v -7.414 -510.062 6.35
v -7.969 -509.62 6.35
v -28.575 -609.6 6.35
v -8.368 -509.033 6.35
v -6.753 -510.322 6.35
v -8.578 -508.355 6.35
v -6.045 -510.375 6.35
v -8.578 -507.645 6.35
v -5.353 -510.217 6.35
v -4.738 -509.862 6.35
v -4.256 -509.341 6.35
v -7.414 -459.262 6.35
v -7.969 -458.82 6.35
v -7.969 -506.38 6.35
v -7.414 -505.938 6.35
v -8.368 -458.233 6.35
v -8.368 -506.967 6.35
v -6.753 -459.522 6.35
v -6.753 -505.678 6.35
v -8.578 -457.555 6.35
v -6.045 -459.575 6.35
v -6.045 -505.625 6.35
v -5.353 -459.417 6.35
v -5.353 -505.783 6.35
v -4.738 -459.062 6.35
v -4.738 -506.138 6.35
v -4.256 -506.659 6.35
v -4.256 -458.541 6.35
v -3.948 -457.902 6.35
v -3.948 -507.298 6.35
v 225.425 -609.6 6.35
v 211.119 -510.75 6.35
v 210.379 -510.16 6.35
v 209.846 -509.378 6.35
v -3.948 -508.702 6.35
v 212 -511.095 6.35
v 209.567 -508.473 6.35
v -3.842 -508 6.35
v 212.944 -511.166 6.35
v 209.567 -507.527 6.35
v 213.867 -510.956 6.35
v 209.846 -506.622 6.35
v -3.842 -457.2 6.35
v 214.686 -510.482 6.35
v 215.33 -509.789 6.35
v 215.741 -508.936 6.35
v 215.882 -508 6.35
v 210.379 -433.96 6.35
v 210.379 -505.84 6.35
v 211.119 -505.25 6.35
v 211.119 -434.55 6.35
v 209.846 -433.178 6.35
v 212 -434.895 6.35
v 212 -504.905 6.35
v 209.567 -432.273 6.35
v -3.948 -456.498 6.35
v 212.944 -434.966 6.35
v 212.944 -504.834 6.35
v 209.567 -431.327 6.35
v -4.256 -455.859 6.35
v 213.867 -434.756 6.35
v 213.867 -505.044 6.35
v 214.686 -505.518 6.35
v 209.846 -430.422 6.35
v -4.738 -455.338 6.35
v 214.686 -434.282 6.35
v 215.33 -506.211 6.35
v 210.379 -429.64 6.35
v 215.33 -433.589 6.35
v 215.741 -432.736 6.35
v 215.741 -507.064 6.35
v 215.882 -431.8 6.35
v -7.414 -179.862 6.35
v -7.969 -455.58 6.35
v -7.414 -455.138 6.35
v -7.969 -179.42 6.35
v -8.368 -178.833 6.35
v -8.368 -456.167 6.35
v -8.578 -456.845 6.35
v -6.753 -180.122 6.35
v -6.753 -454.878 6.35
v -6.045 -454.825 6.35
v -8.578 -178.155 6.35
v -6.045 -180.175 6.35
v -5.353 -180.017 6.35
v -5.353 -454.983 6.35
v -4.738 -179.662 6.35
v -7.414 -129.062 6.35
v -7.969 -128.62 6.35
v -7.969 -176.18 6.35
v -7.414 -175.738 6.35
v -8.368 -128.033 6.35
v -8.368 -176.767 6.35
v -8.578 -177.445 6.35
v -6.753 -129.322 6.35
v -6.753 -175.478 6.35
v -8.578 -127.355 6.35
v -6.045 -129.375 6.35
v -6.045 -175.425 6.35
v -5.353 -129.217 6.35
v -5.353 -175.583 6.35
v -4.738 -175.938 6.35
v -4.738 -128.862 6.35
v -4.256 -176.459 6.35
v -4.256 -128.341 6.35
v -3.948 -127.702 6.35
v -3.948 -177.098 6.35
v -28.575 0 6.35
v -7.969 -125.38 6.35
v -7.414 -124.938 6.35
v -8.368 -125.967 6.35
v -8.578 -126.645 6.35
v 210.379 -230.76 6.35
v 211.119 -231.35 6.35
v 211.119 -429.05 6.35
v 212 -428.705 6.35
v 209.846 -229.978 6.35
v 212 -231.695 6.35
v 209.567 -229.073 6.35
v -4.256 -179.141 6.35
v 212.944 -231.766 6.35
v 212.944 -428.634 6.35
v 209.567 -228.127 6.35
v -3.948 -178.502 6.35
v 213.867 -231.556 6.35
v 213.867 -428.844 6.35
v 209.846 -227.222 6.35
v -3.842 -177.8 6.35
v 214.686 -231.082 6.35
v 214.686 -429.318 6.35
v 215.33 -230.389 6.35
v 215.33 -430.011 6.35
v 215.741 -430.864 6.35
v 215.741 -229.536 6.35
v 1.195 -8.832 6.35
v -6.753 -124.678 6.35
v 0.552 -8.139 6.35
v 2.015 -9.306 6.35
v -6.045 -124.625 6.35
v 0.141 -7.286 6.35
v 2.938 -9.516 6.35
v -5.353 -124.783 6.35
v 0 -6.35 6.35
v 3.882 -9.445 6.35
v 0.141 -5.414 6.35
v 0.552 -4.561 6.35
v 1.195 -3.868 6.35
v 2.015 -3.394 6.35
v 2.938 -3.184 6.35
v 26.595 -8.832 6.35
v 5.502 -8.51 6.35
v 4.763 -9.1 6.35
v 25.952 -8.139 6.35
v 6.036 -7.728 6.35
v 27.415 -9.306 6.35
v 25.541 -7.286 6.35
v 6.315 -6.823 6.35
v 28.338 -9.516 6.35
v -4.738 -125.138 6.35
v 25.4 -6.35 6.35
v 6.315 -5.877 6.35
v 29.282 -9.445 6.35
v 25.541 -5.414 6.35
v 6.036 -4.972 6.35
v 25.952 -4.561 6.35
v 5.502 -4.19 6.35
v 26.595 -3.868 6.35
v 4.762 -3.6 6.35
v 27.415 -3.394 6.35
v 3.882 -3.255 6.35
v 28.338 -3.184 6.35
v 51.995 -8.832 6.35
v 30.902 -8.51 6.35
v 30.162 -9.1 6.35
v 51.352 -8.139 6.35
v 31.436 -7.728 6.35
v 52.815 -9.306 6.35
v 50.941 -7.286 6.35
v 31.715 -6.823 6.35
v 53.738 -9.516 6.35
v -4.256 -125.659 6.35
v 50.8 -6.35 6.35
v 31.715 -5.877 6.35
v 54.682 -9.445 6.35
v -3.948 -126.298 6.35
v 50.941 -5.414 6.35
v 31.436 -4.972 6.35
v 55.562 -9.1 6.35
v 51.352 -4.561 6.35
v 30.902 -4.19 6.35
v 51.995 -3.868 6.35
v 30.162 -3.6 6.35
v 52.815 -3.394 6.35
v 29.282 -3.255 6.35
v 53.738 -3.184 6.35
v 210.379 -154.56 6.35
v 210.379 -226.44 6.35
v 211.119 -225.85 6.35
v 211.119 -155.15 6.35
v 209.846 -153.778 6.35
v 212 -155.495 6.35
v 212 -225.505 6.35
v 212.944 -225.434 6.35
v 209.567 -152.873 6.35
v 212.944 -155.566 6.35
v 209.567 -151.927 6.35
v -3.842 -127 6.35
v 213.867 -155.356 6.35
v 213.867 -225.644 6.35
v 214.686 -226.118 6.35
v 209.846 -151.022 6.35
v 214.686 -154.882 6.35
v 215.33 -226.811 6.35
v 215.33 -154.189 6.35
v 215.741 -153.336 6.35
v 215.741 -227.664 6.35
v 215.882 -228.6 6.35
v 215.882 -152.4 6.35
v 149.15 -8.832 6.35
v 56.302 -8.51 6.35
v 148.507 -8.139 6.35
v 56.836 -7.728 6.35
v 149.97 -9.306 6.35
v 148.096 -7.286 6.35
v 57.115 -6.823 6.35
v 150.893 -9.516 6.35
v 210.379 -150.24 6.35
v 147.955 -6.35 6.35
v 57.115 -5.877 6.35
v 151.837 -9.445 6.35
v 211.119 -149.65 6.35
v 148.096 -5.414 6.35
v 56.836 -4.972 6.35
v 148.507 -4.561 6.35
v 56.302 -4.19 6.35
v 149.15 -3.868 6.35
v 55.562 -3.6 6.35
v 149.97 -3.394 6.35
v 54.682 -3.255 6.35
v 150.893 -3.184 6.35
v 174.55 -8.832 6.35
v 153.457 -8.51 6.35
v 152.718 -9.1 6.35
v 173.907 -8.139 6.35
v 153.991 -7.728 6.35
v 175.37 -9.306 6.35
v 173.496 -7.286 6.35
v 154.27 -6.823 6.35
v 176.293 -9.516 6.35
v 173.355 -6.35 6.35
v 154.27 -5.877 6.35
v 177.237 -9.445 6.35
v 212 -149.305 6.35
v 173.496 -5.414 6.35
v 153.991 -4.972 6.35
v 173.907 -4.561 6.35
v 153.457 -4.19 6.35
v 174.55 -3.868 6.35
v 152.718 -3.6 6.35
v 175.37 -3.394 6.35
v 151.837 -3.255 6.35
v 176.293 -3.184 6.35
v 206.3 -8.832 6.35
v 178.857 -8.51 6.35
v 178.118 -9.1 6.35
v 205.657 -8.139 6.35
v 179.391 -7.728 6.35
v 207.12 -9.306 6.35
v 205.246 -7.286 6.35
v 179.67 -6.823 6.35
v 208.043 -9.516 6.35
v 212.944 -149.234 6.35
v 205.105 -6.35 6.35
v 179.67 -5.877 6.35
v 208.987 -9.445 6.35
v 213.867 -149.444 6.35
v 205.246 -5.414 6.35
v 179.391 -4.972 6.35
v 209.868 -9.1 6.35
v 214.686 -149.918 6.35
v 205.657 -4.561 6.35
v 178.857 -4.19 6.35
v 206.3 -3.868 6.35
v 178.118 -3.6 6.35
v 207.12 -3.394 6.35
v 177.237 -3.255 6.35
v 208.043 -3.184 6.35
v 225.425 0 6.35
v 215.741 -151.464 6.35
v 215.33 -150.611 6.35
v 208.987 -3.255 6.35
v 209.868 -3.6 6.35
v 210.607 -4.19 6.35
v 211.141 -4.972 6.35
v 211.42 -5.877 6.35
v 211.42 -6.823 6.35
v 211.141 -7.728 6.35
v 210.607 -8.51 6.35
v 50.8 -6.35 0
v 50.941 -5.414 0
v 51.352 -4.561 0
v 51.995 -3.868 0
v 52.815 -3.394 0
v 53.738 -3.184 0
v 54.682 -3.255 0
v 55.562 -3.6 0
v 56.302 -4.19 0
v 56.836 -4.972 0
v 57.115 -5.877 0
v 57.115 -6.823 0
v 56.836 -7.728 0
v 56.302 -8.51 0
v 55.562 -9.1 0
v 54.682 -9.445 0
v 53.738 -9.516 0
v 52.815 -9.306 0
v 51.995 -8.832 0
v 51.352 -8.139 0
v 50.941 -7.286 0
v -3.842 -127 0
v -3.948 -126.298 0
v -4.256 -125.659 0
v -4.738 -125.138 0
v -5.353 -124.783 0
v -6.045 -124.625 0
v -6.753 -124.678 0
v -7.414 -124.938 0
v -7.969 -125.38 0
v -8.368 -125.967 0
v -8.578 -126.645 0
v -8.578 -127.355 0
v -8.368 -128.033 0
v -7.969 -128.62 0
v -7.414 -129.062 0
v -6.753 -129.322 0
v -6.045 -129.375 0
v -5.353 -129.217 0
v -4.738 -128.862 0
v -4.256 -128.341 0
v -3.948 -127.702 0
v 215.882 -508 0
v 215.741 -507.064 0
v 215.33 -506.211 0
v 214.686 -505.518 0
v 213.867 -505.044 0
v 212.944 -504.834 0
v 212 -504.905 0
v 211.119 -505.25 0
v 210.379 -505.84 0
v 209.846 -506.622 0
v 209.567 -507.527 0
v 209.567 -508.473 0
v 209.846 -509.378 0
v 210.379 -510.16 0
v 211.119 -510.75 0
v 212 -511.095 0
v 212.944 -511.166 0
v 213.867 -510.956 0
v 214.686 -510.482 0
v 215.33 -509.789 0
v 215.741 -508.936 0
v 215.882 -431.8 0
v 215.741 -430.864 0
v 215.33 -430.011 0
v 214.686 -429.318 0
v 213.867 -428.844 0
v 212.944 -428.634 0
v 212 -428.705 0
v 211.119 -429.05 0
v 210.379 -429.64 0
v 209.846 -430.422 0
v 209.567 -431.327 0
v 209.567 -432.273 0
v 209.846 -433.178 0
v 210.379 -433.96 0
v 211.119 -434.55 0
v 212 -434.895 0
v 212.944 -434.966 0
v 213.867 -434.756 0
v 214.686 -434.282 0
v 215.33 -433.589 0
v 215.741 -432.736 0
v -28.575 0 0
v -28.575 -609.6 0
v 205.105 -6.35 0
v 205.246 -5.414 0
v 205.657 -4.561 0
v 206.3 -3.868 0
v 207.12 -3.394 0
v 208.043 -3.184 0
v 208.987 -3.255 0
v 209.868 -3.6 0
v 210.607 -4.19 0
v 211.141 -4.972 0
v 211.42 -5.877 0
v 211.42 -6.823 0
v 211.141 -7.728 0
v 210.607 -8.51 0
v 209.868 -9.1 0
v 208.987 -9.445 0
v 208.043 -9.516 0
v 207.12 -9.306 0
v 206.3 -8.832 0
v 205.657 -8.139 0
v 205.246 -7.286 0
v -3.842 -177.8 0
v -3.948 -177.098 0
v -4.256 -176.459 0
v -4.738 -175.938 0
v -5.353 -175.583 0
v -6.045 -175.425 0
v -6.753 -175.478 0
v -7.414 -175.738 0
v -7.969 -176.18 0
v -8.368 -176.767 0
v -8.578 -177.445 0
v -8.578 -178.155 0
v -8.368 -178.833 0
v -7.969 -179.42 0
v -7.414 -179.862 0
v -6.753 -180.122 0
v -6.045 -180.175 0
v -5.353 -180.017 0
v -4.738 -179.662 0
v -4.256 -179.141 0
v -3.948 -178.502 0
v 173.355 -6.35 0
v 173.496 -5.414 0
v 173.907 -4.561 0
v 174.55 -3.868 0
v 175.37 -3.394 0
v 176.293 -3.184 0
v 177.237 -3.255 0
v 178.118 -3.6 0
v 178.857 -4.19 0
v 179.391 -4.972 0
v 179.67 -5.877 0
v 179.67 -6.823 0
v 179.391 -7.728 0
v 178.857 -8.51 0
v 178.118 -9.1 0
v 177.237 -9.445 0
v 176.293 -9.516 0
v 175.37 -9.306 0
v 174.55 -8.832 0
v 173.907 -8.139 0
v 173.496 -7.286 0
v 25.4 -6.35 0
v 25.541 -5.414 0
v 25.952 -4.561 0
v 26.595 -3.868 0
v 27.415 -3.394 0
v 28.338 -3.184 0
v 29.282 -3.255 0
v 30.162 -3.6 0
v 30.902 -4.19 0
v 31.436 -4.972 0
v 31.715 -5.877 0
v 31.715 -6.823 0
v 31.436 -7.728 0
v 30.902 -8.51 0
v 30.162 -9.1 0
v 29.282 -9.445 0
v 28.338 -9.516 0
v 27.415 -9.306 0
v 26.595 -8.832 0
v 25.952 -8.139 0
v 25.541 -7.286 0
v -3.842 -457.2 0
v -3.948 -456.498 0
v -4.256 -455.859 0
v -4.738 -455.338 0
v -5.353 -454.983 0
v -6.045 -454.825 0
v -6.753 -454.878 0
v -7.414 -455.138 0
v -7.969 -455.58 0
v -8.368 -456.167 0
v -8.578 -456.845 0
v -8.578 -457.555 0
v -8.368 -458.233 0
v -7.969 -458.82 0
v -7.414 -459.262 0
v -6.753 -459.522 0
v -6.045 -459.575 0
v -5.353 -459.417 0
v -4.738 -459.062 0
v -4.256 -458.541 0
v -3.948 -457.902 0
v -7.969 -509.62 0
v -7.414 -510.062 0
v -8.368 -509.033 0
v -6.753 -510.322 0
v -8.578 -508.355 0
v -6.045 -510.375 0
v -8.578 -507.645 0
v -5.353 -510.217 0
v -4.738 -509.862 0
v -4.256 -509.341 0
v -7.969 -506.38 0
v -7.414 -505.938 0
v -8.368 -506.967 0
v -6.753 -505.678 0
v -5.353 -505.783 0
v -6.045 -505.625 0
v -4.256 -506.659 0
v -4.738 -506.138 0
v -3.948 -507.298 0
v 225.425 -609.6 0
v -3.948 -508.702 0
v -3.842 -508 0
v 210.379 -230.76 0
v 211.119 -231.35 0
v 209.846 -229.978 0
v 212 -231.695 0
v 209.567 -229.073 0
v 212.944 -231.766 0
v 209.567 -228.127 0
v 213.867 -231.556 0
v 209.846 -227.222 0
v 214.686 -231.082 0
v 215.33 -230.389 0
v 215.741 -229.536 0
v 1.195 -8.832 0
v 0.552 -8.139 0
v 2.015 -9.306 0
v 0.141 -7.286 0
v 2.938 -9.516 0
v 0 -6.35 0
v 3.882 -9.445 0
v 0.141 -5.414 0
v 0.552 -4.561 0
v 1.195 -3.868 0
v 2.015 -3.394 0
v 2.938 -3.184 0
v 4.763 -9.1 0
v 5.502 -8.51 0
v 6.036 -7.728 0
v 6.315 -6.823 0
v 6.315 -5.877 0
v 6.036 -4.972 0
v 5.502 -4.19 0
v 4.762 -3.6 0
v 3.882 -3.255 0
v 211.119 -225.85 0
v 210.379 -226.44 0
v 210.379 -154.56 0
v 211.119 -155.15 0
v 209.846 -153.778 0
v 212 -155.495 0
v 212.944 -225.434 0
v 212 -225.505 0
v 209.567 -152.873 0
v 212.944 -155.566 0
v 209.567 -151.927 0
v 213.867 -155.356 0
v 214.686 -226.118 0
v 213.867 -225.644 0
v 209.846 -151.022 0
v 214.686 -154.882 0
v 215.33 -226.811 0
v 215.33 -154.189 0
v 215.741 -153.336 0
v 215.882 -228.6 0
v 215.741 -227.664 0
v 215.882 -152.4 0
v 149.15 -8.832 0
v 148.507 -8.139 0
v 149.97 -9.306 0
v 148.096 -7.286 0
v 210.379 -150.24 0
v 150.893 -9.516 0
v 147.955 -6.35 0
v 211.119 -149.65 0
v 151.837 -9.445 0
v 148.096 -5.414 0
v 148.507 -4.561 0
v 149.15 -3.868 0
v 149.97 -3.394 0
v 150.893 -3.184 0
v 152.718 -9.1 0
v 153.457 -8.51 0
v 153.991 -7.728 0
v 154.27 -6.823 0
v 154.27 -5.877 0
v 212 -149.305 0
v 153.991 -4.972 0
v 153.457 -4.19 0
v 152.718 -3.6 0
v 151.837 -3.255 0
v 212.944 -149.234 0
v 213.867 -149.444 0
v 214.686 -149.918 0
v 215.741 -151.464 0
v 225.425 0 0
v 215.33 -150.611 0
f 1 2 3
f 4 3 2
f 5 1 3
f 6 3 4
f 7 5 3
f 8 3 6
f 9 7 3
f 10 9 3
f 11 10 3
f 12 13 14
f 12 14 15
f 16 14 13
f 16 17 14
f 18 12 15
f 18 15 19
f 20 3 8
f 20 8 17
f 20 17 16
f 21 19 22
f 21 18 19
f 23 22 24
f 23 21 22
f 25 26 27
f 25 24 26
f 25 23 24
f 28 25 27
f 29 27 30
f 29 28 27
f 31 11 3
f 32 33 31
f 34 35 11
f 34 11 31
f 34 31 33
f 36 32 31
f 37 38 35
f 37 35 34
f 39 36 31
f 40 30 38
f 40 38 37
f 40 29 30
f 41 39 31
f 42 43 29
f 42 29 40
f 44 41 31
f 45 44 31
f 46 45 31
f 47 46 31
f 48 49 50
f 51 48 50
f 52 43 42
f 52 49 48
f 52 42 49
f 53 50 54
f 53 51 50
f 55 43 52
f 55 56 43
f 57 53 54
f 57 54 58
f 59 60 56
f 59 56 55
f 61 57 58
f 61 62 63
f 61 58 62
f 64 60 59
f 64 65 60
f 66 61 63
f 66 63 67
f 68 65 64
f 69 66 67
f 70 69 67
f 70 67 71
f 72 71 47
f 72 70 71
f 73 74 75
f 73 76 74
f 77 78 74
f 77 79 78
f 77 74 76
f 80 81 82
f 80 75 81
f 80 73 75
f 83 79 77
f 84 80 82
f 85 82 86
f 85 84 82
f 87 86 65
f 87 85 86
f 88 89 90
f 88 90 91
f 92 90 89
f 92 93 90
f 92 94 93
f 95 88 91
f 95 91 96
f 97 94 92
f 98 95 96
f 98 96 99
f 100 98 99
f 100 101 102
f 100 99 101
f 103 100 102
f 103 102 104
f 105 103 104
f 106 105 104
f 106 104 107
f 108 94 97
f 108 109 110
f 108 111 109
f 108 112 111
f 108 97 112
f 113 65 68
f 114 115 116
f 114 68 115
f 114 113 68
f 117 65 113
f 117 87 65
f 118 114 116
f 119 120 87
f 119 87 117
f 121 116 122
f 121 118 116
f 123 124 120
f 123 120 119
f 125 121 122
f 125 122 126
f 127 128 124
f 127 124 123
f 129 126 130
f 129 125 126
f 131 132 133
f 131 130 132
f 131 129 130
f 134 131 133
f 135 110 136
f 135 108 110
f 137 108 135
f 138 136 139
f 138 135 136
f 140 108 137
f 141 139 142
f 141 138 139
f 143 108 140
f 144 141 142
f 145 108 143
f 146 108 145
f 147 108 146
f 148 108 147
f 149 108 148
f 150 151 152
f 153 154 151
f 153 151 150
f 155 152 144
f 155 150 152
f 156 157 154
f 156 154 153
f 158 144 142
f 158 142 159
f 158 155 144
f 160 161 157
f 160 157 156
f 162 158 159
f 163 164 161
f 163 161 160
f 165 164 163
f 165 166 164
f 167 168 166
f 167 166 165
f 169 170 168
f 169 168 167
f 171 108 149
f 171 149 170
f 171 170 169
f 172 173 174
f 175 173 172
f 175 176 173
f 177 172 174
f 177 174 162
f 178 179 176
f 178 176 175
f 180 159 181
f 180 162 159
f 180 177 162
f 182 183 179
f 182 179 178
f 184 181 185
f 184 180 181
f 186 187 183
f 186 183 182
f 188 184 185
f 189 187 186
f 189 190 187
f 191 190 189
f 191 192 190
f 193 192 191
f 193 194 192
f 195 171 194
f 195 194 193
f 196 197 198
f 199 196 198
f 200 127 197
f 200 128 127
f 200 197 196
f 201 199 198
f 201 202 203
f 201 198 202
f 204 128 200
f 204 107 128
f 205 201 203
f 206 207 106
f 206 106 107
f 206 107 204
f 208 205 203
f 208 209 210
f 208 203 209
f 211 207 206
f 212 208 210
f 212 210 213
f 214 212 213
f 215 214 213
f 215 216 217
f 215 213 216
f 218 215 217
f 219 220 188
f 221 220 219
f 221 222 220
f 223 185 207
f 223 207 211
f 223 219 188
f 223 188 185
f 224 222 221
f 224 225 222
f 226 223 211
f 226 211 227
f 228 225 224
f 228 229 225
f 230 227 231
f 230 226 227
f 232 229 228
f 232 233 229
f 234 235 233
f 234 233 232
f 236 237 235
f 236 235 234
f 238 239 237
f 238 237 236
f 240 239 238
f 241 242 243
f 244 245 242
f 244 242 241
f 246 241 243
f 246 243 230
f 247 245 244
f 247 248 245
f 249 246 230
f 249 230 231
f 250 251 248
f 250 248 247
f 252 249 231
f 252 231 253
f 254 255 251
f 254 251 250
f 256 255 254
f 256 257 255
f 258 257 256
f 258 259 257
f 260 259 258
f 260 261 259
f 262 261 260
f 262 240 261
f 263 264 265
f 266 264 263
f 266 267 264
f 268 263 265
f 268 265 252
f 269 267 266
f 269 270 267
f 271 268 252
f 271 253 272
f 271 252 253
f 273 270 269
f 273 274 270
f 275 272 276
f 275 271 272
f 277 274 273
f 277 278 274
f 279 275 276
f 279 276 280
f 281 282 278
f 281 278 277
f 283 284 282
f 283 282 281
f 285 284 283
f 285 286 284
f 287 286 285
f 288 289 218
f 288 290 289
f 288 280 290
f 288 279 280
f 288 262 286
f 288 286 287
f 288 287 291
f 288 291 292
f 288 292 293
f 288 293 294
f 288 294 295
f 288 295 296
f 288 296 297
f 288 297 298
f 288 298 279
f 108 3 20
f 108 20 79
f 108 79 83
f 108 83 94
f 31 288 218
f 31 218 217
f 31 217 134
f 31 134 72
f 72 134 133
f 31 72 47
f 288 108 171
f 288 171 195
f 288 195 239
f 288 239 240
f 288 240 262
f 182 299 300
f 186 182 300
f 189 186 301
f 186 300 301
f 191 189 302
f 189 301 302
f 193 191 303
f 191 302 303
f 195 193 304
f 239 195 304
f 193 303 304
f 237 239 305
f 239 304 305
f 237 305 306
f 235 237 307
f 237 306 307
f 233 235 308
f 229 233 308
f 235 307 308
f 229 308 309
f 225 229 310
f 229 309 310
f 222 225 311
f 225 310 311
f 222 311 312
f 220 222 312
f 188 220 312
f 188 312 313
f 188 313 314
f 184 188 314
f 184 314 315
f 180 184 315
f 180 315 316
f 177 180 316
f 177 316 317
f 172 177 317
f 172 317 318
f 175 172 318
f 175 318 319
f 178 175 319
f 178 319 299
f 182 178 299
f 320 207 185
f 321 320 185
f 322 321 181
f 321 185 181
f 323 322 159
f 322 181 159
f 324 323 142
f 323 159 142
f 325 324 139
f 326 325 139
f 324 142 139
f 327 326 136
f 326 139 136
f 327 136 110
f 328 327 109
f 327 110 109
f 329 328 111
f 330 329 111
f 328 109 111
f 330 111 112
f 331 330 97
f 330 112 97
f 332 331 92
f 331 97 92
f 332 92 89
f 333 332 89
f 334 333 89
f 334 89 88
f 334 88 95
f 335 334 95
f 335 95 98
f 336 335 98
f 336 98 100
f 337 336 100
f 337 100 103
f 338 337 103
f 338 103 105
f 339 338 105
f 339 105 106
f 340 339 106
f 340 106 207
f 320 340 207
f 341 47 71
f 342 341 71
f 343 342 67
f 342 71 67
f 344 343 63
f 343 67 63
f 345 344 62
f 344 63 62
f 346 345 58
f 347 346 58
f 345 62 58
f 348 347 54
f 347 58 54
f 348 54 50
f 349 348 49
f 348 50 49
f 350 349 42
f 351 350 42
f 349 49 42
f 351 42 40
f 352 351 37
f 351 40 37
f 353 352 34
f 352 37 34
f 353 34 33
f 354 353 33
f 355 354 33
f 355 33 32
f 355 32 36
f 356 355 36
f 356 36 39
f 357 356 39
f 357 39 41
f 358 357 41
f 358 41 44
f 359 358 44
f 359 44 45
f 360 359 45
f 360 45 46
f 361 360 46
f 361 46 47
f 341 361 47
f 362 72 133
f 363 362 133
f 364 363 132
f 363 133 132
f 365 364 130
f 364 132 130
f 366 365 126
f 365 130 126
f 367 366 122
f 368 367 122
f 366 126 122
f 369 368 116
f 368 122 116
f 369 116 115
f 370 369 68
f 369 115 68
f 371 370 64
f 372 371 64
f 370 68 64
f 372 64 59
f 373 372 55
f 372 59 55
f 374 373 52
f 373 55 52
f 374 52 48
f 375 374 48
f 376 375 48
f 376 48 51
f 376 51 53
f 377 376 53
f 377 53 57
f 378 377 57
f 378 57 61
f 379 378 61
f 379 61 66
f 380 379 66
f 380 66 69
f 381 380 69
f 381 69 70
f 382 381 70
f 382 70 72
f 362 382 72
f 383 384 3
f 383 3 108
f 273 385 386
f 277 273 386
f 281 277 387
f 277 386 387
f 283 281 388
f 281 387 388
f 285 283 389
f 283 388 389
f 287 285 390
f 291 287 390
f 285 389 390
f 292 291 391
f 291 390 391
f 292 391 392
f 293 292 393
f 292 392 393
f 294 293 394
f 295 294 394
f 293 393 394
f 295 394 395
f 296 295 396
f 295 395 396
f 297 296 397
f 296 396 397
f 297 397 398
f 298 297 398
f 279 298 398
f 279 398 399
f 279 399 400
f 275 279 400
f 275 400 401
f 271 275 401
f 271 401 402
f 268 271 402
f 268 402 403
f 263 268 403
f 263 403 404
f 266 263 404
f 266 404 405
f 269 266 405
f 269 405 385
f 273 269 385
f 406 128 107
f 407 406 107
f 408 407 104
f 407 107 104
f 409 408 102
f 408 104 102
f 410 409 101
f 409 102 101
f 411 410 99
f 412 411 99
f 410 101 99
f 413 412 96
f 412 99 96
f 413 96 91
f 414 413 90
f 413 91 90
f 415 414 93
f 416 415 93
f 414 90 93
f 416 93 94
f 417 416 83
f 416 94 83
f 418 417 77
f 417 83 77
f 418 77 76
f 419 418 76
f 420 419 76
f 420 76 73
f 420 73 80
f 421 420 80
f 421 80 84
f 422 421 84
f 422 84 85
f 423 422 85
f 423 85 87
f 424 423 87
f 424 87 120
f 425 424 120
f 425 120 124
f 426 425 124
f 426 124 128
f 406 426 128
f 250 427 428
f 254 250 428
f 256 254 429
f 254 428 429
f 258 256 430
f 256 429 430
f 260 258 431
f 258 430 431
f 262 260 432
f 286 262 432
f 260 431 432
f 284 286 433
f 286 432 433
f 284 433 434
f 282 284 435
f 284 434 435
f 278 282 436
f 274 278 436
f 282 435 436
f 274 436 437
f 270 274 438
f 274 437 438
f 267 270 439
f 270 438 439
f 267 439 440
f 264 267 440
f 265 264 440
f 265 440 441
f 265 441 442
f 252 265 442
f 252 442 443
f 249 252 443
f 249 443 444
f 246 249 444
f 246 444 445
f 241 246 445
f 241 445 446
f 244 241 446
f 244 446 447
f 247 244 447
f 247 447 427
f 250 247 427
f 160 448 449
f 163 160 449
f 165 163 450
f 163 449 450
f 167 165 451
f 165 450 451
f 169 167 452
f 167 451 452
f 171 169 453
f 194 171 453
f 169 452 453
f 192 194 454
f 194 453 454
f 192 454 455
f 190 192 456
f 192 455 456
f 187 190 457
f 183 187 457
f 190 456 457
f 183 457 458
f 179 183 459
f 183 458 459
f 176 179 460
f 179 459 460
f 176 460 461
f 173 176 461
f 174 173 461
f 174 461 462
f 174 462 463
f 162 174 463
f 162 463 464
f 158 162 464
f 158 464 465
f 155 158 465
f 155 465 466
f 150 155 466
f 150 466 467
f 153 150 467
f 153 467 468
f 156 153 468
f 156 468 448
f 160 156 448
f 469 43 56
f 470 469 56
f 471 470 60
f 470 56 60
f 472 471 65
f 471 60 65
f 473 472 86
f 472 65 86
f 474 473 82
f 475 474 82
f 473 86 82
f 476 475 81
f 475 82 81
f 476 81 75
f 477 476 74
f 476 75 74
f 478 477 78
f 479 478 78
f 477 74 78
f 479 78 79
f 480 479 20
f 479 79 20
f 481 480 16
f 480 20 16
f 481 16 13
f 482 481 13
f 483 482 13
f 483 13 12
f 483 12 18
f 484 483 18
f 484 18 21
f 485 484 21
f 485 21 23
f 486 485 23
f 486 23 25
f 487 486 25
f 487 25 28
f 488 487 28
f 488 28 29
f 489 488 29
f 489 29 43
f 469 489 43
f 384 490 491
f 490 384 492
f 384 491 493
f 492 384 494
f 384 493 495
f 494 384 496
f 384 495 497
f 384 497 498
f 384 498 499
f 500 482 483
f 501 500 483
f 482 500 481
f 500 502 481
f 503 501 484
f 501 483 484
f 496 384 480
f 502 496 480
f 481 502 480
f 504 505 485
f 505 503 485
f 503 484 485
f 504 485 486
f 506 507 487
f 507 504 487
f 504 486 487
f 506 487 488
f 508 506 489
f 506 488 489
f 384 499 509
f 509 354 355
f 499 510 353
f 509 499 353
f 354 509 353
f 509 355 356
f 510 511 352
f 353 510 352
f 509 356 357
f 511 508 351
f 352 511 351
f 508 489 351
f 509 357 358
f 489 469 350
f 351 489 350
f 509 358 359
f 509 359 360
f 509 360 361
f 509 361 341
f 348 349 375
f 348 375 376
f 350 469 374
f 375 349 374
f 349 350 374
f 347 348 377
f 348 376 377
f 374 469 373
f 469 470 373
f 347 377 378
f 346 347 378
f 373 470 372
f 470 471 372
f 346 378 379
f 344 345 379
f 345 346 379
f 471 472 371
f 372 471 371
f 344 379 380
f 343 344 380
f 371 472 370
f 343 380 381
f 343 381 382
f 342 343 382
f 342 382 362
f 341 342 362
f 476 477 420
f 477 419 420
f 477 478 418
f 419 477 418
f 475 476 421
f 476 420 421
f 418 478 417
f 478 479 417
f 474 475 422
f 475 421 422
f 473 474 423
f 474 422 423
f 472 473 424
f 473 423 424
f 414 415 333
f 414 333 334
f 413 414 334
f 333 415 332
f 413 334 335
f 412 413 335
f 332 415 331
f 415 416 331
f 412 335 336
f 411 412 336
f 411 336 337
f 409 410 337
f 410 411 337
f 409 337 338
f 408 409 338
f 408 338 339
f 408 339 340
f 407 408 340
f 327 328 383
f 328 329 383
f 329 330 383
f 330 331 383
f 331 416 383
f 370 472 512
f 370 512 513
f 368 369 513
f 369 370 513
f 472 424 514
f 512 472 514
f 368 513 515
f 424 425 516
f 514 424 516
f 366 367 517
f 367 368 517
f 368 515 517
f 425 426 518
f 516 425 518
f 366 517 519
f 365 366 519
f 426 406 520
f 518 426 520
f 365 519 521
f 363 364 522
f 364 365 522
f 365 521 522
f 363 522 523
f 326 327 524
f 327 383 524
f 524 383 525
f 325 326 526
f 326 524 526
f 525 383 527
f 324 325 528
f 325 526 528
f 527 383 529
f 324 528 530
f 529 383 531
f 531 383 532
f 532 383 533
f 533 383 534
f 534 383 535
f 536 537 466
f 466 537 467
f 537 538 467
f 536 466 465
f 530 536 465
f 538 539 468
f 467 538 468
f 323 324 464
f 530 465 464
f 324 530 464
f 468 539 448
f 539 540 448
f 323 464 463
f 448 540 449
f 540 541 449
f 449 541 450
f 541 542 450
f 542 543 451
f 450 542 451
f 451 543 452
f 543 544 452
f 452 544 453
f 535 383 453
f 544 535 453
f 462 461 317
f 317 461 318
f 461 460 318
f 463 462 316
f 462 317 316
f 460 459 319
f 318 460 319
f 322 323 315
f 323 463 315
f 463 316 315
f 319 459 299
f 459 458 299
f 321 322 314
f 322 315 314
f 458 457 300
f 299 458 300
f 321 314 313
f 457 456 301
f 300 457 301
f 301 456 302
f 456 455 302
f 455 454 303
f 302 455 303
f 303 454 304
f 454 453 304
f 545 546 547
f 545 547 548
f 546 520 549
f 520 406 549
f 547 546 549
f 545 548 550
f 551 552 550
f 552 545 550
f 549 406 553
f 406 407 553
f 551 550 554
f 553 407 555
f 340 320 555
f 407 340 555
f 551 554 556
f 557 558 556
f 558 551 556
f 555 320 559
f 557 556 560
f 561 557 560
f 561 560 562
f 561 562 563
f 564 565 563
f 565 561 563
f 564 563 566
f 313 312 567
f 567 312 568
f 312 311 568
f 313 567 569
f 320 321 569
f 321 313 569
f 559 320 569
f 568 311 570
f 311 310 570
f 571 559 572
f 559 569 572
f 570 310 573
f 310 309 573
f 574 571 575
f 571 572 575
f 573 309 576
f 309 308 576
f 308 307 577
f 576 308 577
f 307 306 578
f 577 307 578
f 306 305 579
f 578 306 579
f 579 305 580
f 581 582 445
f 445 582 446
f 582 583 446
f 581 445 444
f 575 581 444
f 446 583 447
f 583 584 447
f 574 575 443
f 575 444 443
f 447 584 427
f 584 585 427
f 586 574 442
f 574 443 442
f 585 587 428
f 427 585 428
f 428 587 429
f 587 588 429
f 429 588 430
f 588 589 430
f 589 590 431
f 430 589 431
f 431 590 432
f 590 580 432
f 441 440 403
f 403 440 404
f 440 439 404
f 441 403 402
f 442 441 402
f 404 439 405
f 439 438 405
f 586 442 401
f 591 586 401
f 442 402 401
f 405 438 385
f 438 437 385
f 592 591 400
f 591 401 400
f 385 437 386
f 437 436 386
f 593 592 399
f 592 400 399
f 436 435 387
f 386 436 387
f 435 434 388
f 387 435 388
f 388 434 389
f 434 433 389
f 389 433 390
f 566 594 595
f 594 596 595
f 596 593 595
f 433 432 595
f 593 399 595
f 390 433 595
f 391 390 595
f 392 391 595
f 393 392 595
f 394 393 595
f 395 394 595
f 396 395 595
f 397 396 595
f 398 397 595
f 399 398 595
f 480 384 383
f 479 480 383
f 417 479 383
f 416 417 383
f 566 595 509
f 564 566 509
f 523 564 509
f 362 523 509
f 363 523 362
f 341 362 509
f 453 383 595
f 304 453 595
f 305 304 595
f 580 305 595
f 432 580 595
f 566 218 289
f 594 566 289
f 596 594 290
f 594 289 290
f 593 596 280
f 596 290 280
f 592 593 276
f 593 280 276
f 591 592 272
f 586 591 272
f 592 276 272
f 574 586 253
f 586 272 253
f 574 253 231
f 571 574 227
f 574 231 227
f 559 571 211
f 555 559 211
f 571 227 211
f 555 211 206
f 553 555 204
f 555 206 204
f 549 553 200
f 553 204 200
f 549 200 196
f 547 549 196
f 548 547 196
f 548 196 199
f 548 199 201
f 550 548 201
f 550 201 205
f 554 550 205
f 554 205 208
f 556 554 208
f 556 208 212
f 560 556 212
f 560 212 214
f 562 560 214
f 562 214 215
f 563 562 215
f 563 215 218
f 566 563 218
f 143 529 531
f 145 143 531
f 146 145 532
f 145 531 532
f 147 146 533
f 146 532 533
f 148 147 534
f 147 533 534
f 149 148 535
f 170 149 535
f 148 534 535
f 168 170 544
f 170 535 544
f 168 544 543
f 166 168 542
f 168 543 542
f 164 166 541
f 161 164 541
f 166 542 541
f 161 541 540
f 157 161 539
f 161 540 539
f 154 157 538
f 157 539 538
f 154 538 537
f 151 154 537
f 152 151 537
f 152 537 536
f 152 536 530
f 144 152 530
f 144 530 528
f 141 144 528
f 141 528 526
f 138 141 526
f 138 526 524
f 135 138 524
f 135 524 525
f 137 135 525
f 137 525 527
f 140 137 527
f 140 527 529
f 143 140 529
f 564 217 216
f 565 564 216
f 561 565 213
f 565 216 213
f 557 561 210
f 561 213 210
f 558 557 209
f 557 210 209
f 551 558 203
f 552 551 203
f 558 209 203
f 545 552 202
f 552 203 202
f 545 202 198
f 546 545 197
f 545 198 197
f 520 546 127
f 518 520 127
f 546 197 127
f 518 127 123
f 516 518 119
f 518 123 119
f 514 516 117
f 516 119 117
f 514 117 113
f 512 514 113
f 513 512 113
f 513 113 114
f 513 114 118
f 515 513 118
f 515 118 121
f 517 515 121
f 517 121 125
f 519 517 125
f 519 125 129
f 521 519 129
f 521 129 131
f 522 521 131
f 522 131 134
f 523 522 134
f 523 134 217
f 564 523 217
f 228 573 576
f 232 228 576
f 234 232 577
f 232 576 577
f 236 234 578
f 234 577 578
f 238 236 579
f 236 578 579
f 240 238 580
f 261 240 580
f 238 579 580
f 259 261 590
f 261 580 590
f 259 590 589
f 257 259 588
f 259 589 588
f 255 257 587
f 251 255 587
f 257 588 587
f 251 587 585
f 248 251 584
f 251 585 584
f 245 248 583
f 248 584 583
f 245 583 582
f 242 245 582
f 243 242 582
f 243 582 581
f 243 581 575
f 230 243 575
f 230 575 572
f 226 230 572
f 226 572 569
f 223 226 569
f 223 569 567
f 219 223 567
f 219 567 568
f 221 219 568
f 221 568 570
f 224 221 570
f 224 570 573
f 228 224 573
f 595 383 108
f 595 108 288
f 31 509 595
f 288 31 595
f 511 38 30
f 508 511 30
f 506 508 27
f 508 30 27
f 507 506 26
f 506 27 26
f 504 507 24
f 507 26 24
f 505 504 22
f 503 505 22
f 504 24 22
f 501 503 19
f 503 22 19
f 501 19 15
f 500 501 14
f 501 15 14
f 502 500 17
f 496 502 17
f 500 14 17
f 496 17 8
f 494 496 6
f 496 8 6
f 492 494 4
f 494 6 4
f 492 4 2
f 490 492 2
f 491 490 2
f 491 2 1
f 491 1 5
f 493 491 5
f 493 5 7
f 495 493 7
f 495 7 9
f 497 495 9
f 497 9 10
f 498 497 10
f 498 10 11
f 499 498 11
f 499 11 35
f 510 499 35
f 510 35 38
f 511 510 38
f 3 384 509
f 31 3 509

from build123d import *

# Parameters (mm, degrees)
SKETCH1_W           = 254
SKETCH1_H           = 609.6
BOSS_EXTRUDE1_DEPTH = 6.35
SKETCH2_R           = 2.38125
CUT_EXTRUDE1_DEPTH  = 7.35
SKETCH3_R           = 3.175
CUT_EXTRUDE2_DEPTH  = 7.35
SKETCH4_R           = 3.175
CUT_EXTRUDE3_DEPTH  = 7.35


with BuildPart() as part:
    # Sketch1 → Boss-Extrude1 (new body)
    with BuildSketch(Plane.XY):
        with Locations((98.425, -304.8)):
            Rectangle(SKETCH1_W, SKETCH1_H)
    extrude(amount=BOSS_EXTRUDE1_DEPTH)

    # Sketch2 → Cut-Extrude1 (cut, through all)
    with BuildSketch(Plane.XY.offset(6.35)):
        with Locations((-6.223, -127)):
            Circle(SKETCH2_R)
        with Locations((-6.223, -177.8)):
            Circle(SKETCH2_R)
        with Locations((-6.223, -457.2)):
            Circle(SKETCH2_R)
        with Locations((-6.223, -508)):
            Circle(SKETCH2_R)
    extrude(amount=-CUT_EXTRUDE1_DEPTH, mode=Mode.SUBTRACT)

    # Sketch3 → Cut-Extrude2 (cut, through all)
    with BuildSketch(Plane(origin=(0, 0, 0), x_dir=(-1, 0, 0), z_dir=(0, 0, -1))):
        with Locations((-208.28, -6.35)):
            Circle(SKETCH3_R)
        with Locations((-176.53, -6.35)):
            Circle(SKETCH3_R)
        with Locations((-151.13, -6.35)):
            Circle(SKETCH3_R)
        with Locations((-53.975, -6.35)):
            Circle(SKETCH3_R)
        with Locations((-28.575, -6.35)):
            Circle(SKETCH3_R)
        with Locations((-3.175, -6.35)):
            Circle(SKETCH3_R)
    extrude(amount=-CUT_EXTRUDE2_DEPTH, mode=Mode.SUBTRACT)

    # Sketch4 → Cut-Extrude3 (cut, through all)
    with BuildSketch(Plane.XY.offset(6.35)):
        with Locations((212.706676403, -431.8)):
            Circle(SKETCH4_R)
        with Locations((212.706676403, -508)):
            Circle(SKETCH4_R)
        with Locations((212.706676403, -228.6)):
            Circle(SKETCH4_R)
        with Locations((212.706676403, -152.4)):
            Circle(SKETCH4_R)
    extrude(amount=-CUT_EXTRUDE3_DEPTH, mode=Mode.SUBTRACT)


solid = part.part
